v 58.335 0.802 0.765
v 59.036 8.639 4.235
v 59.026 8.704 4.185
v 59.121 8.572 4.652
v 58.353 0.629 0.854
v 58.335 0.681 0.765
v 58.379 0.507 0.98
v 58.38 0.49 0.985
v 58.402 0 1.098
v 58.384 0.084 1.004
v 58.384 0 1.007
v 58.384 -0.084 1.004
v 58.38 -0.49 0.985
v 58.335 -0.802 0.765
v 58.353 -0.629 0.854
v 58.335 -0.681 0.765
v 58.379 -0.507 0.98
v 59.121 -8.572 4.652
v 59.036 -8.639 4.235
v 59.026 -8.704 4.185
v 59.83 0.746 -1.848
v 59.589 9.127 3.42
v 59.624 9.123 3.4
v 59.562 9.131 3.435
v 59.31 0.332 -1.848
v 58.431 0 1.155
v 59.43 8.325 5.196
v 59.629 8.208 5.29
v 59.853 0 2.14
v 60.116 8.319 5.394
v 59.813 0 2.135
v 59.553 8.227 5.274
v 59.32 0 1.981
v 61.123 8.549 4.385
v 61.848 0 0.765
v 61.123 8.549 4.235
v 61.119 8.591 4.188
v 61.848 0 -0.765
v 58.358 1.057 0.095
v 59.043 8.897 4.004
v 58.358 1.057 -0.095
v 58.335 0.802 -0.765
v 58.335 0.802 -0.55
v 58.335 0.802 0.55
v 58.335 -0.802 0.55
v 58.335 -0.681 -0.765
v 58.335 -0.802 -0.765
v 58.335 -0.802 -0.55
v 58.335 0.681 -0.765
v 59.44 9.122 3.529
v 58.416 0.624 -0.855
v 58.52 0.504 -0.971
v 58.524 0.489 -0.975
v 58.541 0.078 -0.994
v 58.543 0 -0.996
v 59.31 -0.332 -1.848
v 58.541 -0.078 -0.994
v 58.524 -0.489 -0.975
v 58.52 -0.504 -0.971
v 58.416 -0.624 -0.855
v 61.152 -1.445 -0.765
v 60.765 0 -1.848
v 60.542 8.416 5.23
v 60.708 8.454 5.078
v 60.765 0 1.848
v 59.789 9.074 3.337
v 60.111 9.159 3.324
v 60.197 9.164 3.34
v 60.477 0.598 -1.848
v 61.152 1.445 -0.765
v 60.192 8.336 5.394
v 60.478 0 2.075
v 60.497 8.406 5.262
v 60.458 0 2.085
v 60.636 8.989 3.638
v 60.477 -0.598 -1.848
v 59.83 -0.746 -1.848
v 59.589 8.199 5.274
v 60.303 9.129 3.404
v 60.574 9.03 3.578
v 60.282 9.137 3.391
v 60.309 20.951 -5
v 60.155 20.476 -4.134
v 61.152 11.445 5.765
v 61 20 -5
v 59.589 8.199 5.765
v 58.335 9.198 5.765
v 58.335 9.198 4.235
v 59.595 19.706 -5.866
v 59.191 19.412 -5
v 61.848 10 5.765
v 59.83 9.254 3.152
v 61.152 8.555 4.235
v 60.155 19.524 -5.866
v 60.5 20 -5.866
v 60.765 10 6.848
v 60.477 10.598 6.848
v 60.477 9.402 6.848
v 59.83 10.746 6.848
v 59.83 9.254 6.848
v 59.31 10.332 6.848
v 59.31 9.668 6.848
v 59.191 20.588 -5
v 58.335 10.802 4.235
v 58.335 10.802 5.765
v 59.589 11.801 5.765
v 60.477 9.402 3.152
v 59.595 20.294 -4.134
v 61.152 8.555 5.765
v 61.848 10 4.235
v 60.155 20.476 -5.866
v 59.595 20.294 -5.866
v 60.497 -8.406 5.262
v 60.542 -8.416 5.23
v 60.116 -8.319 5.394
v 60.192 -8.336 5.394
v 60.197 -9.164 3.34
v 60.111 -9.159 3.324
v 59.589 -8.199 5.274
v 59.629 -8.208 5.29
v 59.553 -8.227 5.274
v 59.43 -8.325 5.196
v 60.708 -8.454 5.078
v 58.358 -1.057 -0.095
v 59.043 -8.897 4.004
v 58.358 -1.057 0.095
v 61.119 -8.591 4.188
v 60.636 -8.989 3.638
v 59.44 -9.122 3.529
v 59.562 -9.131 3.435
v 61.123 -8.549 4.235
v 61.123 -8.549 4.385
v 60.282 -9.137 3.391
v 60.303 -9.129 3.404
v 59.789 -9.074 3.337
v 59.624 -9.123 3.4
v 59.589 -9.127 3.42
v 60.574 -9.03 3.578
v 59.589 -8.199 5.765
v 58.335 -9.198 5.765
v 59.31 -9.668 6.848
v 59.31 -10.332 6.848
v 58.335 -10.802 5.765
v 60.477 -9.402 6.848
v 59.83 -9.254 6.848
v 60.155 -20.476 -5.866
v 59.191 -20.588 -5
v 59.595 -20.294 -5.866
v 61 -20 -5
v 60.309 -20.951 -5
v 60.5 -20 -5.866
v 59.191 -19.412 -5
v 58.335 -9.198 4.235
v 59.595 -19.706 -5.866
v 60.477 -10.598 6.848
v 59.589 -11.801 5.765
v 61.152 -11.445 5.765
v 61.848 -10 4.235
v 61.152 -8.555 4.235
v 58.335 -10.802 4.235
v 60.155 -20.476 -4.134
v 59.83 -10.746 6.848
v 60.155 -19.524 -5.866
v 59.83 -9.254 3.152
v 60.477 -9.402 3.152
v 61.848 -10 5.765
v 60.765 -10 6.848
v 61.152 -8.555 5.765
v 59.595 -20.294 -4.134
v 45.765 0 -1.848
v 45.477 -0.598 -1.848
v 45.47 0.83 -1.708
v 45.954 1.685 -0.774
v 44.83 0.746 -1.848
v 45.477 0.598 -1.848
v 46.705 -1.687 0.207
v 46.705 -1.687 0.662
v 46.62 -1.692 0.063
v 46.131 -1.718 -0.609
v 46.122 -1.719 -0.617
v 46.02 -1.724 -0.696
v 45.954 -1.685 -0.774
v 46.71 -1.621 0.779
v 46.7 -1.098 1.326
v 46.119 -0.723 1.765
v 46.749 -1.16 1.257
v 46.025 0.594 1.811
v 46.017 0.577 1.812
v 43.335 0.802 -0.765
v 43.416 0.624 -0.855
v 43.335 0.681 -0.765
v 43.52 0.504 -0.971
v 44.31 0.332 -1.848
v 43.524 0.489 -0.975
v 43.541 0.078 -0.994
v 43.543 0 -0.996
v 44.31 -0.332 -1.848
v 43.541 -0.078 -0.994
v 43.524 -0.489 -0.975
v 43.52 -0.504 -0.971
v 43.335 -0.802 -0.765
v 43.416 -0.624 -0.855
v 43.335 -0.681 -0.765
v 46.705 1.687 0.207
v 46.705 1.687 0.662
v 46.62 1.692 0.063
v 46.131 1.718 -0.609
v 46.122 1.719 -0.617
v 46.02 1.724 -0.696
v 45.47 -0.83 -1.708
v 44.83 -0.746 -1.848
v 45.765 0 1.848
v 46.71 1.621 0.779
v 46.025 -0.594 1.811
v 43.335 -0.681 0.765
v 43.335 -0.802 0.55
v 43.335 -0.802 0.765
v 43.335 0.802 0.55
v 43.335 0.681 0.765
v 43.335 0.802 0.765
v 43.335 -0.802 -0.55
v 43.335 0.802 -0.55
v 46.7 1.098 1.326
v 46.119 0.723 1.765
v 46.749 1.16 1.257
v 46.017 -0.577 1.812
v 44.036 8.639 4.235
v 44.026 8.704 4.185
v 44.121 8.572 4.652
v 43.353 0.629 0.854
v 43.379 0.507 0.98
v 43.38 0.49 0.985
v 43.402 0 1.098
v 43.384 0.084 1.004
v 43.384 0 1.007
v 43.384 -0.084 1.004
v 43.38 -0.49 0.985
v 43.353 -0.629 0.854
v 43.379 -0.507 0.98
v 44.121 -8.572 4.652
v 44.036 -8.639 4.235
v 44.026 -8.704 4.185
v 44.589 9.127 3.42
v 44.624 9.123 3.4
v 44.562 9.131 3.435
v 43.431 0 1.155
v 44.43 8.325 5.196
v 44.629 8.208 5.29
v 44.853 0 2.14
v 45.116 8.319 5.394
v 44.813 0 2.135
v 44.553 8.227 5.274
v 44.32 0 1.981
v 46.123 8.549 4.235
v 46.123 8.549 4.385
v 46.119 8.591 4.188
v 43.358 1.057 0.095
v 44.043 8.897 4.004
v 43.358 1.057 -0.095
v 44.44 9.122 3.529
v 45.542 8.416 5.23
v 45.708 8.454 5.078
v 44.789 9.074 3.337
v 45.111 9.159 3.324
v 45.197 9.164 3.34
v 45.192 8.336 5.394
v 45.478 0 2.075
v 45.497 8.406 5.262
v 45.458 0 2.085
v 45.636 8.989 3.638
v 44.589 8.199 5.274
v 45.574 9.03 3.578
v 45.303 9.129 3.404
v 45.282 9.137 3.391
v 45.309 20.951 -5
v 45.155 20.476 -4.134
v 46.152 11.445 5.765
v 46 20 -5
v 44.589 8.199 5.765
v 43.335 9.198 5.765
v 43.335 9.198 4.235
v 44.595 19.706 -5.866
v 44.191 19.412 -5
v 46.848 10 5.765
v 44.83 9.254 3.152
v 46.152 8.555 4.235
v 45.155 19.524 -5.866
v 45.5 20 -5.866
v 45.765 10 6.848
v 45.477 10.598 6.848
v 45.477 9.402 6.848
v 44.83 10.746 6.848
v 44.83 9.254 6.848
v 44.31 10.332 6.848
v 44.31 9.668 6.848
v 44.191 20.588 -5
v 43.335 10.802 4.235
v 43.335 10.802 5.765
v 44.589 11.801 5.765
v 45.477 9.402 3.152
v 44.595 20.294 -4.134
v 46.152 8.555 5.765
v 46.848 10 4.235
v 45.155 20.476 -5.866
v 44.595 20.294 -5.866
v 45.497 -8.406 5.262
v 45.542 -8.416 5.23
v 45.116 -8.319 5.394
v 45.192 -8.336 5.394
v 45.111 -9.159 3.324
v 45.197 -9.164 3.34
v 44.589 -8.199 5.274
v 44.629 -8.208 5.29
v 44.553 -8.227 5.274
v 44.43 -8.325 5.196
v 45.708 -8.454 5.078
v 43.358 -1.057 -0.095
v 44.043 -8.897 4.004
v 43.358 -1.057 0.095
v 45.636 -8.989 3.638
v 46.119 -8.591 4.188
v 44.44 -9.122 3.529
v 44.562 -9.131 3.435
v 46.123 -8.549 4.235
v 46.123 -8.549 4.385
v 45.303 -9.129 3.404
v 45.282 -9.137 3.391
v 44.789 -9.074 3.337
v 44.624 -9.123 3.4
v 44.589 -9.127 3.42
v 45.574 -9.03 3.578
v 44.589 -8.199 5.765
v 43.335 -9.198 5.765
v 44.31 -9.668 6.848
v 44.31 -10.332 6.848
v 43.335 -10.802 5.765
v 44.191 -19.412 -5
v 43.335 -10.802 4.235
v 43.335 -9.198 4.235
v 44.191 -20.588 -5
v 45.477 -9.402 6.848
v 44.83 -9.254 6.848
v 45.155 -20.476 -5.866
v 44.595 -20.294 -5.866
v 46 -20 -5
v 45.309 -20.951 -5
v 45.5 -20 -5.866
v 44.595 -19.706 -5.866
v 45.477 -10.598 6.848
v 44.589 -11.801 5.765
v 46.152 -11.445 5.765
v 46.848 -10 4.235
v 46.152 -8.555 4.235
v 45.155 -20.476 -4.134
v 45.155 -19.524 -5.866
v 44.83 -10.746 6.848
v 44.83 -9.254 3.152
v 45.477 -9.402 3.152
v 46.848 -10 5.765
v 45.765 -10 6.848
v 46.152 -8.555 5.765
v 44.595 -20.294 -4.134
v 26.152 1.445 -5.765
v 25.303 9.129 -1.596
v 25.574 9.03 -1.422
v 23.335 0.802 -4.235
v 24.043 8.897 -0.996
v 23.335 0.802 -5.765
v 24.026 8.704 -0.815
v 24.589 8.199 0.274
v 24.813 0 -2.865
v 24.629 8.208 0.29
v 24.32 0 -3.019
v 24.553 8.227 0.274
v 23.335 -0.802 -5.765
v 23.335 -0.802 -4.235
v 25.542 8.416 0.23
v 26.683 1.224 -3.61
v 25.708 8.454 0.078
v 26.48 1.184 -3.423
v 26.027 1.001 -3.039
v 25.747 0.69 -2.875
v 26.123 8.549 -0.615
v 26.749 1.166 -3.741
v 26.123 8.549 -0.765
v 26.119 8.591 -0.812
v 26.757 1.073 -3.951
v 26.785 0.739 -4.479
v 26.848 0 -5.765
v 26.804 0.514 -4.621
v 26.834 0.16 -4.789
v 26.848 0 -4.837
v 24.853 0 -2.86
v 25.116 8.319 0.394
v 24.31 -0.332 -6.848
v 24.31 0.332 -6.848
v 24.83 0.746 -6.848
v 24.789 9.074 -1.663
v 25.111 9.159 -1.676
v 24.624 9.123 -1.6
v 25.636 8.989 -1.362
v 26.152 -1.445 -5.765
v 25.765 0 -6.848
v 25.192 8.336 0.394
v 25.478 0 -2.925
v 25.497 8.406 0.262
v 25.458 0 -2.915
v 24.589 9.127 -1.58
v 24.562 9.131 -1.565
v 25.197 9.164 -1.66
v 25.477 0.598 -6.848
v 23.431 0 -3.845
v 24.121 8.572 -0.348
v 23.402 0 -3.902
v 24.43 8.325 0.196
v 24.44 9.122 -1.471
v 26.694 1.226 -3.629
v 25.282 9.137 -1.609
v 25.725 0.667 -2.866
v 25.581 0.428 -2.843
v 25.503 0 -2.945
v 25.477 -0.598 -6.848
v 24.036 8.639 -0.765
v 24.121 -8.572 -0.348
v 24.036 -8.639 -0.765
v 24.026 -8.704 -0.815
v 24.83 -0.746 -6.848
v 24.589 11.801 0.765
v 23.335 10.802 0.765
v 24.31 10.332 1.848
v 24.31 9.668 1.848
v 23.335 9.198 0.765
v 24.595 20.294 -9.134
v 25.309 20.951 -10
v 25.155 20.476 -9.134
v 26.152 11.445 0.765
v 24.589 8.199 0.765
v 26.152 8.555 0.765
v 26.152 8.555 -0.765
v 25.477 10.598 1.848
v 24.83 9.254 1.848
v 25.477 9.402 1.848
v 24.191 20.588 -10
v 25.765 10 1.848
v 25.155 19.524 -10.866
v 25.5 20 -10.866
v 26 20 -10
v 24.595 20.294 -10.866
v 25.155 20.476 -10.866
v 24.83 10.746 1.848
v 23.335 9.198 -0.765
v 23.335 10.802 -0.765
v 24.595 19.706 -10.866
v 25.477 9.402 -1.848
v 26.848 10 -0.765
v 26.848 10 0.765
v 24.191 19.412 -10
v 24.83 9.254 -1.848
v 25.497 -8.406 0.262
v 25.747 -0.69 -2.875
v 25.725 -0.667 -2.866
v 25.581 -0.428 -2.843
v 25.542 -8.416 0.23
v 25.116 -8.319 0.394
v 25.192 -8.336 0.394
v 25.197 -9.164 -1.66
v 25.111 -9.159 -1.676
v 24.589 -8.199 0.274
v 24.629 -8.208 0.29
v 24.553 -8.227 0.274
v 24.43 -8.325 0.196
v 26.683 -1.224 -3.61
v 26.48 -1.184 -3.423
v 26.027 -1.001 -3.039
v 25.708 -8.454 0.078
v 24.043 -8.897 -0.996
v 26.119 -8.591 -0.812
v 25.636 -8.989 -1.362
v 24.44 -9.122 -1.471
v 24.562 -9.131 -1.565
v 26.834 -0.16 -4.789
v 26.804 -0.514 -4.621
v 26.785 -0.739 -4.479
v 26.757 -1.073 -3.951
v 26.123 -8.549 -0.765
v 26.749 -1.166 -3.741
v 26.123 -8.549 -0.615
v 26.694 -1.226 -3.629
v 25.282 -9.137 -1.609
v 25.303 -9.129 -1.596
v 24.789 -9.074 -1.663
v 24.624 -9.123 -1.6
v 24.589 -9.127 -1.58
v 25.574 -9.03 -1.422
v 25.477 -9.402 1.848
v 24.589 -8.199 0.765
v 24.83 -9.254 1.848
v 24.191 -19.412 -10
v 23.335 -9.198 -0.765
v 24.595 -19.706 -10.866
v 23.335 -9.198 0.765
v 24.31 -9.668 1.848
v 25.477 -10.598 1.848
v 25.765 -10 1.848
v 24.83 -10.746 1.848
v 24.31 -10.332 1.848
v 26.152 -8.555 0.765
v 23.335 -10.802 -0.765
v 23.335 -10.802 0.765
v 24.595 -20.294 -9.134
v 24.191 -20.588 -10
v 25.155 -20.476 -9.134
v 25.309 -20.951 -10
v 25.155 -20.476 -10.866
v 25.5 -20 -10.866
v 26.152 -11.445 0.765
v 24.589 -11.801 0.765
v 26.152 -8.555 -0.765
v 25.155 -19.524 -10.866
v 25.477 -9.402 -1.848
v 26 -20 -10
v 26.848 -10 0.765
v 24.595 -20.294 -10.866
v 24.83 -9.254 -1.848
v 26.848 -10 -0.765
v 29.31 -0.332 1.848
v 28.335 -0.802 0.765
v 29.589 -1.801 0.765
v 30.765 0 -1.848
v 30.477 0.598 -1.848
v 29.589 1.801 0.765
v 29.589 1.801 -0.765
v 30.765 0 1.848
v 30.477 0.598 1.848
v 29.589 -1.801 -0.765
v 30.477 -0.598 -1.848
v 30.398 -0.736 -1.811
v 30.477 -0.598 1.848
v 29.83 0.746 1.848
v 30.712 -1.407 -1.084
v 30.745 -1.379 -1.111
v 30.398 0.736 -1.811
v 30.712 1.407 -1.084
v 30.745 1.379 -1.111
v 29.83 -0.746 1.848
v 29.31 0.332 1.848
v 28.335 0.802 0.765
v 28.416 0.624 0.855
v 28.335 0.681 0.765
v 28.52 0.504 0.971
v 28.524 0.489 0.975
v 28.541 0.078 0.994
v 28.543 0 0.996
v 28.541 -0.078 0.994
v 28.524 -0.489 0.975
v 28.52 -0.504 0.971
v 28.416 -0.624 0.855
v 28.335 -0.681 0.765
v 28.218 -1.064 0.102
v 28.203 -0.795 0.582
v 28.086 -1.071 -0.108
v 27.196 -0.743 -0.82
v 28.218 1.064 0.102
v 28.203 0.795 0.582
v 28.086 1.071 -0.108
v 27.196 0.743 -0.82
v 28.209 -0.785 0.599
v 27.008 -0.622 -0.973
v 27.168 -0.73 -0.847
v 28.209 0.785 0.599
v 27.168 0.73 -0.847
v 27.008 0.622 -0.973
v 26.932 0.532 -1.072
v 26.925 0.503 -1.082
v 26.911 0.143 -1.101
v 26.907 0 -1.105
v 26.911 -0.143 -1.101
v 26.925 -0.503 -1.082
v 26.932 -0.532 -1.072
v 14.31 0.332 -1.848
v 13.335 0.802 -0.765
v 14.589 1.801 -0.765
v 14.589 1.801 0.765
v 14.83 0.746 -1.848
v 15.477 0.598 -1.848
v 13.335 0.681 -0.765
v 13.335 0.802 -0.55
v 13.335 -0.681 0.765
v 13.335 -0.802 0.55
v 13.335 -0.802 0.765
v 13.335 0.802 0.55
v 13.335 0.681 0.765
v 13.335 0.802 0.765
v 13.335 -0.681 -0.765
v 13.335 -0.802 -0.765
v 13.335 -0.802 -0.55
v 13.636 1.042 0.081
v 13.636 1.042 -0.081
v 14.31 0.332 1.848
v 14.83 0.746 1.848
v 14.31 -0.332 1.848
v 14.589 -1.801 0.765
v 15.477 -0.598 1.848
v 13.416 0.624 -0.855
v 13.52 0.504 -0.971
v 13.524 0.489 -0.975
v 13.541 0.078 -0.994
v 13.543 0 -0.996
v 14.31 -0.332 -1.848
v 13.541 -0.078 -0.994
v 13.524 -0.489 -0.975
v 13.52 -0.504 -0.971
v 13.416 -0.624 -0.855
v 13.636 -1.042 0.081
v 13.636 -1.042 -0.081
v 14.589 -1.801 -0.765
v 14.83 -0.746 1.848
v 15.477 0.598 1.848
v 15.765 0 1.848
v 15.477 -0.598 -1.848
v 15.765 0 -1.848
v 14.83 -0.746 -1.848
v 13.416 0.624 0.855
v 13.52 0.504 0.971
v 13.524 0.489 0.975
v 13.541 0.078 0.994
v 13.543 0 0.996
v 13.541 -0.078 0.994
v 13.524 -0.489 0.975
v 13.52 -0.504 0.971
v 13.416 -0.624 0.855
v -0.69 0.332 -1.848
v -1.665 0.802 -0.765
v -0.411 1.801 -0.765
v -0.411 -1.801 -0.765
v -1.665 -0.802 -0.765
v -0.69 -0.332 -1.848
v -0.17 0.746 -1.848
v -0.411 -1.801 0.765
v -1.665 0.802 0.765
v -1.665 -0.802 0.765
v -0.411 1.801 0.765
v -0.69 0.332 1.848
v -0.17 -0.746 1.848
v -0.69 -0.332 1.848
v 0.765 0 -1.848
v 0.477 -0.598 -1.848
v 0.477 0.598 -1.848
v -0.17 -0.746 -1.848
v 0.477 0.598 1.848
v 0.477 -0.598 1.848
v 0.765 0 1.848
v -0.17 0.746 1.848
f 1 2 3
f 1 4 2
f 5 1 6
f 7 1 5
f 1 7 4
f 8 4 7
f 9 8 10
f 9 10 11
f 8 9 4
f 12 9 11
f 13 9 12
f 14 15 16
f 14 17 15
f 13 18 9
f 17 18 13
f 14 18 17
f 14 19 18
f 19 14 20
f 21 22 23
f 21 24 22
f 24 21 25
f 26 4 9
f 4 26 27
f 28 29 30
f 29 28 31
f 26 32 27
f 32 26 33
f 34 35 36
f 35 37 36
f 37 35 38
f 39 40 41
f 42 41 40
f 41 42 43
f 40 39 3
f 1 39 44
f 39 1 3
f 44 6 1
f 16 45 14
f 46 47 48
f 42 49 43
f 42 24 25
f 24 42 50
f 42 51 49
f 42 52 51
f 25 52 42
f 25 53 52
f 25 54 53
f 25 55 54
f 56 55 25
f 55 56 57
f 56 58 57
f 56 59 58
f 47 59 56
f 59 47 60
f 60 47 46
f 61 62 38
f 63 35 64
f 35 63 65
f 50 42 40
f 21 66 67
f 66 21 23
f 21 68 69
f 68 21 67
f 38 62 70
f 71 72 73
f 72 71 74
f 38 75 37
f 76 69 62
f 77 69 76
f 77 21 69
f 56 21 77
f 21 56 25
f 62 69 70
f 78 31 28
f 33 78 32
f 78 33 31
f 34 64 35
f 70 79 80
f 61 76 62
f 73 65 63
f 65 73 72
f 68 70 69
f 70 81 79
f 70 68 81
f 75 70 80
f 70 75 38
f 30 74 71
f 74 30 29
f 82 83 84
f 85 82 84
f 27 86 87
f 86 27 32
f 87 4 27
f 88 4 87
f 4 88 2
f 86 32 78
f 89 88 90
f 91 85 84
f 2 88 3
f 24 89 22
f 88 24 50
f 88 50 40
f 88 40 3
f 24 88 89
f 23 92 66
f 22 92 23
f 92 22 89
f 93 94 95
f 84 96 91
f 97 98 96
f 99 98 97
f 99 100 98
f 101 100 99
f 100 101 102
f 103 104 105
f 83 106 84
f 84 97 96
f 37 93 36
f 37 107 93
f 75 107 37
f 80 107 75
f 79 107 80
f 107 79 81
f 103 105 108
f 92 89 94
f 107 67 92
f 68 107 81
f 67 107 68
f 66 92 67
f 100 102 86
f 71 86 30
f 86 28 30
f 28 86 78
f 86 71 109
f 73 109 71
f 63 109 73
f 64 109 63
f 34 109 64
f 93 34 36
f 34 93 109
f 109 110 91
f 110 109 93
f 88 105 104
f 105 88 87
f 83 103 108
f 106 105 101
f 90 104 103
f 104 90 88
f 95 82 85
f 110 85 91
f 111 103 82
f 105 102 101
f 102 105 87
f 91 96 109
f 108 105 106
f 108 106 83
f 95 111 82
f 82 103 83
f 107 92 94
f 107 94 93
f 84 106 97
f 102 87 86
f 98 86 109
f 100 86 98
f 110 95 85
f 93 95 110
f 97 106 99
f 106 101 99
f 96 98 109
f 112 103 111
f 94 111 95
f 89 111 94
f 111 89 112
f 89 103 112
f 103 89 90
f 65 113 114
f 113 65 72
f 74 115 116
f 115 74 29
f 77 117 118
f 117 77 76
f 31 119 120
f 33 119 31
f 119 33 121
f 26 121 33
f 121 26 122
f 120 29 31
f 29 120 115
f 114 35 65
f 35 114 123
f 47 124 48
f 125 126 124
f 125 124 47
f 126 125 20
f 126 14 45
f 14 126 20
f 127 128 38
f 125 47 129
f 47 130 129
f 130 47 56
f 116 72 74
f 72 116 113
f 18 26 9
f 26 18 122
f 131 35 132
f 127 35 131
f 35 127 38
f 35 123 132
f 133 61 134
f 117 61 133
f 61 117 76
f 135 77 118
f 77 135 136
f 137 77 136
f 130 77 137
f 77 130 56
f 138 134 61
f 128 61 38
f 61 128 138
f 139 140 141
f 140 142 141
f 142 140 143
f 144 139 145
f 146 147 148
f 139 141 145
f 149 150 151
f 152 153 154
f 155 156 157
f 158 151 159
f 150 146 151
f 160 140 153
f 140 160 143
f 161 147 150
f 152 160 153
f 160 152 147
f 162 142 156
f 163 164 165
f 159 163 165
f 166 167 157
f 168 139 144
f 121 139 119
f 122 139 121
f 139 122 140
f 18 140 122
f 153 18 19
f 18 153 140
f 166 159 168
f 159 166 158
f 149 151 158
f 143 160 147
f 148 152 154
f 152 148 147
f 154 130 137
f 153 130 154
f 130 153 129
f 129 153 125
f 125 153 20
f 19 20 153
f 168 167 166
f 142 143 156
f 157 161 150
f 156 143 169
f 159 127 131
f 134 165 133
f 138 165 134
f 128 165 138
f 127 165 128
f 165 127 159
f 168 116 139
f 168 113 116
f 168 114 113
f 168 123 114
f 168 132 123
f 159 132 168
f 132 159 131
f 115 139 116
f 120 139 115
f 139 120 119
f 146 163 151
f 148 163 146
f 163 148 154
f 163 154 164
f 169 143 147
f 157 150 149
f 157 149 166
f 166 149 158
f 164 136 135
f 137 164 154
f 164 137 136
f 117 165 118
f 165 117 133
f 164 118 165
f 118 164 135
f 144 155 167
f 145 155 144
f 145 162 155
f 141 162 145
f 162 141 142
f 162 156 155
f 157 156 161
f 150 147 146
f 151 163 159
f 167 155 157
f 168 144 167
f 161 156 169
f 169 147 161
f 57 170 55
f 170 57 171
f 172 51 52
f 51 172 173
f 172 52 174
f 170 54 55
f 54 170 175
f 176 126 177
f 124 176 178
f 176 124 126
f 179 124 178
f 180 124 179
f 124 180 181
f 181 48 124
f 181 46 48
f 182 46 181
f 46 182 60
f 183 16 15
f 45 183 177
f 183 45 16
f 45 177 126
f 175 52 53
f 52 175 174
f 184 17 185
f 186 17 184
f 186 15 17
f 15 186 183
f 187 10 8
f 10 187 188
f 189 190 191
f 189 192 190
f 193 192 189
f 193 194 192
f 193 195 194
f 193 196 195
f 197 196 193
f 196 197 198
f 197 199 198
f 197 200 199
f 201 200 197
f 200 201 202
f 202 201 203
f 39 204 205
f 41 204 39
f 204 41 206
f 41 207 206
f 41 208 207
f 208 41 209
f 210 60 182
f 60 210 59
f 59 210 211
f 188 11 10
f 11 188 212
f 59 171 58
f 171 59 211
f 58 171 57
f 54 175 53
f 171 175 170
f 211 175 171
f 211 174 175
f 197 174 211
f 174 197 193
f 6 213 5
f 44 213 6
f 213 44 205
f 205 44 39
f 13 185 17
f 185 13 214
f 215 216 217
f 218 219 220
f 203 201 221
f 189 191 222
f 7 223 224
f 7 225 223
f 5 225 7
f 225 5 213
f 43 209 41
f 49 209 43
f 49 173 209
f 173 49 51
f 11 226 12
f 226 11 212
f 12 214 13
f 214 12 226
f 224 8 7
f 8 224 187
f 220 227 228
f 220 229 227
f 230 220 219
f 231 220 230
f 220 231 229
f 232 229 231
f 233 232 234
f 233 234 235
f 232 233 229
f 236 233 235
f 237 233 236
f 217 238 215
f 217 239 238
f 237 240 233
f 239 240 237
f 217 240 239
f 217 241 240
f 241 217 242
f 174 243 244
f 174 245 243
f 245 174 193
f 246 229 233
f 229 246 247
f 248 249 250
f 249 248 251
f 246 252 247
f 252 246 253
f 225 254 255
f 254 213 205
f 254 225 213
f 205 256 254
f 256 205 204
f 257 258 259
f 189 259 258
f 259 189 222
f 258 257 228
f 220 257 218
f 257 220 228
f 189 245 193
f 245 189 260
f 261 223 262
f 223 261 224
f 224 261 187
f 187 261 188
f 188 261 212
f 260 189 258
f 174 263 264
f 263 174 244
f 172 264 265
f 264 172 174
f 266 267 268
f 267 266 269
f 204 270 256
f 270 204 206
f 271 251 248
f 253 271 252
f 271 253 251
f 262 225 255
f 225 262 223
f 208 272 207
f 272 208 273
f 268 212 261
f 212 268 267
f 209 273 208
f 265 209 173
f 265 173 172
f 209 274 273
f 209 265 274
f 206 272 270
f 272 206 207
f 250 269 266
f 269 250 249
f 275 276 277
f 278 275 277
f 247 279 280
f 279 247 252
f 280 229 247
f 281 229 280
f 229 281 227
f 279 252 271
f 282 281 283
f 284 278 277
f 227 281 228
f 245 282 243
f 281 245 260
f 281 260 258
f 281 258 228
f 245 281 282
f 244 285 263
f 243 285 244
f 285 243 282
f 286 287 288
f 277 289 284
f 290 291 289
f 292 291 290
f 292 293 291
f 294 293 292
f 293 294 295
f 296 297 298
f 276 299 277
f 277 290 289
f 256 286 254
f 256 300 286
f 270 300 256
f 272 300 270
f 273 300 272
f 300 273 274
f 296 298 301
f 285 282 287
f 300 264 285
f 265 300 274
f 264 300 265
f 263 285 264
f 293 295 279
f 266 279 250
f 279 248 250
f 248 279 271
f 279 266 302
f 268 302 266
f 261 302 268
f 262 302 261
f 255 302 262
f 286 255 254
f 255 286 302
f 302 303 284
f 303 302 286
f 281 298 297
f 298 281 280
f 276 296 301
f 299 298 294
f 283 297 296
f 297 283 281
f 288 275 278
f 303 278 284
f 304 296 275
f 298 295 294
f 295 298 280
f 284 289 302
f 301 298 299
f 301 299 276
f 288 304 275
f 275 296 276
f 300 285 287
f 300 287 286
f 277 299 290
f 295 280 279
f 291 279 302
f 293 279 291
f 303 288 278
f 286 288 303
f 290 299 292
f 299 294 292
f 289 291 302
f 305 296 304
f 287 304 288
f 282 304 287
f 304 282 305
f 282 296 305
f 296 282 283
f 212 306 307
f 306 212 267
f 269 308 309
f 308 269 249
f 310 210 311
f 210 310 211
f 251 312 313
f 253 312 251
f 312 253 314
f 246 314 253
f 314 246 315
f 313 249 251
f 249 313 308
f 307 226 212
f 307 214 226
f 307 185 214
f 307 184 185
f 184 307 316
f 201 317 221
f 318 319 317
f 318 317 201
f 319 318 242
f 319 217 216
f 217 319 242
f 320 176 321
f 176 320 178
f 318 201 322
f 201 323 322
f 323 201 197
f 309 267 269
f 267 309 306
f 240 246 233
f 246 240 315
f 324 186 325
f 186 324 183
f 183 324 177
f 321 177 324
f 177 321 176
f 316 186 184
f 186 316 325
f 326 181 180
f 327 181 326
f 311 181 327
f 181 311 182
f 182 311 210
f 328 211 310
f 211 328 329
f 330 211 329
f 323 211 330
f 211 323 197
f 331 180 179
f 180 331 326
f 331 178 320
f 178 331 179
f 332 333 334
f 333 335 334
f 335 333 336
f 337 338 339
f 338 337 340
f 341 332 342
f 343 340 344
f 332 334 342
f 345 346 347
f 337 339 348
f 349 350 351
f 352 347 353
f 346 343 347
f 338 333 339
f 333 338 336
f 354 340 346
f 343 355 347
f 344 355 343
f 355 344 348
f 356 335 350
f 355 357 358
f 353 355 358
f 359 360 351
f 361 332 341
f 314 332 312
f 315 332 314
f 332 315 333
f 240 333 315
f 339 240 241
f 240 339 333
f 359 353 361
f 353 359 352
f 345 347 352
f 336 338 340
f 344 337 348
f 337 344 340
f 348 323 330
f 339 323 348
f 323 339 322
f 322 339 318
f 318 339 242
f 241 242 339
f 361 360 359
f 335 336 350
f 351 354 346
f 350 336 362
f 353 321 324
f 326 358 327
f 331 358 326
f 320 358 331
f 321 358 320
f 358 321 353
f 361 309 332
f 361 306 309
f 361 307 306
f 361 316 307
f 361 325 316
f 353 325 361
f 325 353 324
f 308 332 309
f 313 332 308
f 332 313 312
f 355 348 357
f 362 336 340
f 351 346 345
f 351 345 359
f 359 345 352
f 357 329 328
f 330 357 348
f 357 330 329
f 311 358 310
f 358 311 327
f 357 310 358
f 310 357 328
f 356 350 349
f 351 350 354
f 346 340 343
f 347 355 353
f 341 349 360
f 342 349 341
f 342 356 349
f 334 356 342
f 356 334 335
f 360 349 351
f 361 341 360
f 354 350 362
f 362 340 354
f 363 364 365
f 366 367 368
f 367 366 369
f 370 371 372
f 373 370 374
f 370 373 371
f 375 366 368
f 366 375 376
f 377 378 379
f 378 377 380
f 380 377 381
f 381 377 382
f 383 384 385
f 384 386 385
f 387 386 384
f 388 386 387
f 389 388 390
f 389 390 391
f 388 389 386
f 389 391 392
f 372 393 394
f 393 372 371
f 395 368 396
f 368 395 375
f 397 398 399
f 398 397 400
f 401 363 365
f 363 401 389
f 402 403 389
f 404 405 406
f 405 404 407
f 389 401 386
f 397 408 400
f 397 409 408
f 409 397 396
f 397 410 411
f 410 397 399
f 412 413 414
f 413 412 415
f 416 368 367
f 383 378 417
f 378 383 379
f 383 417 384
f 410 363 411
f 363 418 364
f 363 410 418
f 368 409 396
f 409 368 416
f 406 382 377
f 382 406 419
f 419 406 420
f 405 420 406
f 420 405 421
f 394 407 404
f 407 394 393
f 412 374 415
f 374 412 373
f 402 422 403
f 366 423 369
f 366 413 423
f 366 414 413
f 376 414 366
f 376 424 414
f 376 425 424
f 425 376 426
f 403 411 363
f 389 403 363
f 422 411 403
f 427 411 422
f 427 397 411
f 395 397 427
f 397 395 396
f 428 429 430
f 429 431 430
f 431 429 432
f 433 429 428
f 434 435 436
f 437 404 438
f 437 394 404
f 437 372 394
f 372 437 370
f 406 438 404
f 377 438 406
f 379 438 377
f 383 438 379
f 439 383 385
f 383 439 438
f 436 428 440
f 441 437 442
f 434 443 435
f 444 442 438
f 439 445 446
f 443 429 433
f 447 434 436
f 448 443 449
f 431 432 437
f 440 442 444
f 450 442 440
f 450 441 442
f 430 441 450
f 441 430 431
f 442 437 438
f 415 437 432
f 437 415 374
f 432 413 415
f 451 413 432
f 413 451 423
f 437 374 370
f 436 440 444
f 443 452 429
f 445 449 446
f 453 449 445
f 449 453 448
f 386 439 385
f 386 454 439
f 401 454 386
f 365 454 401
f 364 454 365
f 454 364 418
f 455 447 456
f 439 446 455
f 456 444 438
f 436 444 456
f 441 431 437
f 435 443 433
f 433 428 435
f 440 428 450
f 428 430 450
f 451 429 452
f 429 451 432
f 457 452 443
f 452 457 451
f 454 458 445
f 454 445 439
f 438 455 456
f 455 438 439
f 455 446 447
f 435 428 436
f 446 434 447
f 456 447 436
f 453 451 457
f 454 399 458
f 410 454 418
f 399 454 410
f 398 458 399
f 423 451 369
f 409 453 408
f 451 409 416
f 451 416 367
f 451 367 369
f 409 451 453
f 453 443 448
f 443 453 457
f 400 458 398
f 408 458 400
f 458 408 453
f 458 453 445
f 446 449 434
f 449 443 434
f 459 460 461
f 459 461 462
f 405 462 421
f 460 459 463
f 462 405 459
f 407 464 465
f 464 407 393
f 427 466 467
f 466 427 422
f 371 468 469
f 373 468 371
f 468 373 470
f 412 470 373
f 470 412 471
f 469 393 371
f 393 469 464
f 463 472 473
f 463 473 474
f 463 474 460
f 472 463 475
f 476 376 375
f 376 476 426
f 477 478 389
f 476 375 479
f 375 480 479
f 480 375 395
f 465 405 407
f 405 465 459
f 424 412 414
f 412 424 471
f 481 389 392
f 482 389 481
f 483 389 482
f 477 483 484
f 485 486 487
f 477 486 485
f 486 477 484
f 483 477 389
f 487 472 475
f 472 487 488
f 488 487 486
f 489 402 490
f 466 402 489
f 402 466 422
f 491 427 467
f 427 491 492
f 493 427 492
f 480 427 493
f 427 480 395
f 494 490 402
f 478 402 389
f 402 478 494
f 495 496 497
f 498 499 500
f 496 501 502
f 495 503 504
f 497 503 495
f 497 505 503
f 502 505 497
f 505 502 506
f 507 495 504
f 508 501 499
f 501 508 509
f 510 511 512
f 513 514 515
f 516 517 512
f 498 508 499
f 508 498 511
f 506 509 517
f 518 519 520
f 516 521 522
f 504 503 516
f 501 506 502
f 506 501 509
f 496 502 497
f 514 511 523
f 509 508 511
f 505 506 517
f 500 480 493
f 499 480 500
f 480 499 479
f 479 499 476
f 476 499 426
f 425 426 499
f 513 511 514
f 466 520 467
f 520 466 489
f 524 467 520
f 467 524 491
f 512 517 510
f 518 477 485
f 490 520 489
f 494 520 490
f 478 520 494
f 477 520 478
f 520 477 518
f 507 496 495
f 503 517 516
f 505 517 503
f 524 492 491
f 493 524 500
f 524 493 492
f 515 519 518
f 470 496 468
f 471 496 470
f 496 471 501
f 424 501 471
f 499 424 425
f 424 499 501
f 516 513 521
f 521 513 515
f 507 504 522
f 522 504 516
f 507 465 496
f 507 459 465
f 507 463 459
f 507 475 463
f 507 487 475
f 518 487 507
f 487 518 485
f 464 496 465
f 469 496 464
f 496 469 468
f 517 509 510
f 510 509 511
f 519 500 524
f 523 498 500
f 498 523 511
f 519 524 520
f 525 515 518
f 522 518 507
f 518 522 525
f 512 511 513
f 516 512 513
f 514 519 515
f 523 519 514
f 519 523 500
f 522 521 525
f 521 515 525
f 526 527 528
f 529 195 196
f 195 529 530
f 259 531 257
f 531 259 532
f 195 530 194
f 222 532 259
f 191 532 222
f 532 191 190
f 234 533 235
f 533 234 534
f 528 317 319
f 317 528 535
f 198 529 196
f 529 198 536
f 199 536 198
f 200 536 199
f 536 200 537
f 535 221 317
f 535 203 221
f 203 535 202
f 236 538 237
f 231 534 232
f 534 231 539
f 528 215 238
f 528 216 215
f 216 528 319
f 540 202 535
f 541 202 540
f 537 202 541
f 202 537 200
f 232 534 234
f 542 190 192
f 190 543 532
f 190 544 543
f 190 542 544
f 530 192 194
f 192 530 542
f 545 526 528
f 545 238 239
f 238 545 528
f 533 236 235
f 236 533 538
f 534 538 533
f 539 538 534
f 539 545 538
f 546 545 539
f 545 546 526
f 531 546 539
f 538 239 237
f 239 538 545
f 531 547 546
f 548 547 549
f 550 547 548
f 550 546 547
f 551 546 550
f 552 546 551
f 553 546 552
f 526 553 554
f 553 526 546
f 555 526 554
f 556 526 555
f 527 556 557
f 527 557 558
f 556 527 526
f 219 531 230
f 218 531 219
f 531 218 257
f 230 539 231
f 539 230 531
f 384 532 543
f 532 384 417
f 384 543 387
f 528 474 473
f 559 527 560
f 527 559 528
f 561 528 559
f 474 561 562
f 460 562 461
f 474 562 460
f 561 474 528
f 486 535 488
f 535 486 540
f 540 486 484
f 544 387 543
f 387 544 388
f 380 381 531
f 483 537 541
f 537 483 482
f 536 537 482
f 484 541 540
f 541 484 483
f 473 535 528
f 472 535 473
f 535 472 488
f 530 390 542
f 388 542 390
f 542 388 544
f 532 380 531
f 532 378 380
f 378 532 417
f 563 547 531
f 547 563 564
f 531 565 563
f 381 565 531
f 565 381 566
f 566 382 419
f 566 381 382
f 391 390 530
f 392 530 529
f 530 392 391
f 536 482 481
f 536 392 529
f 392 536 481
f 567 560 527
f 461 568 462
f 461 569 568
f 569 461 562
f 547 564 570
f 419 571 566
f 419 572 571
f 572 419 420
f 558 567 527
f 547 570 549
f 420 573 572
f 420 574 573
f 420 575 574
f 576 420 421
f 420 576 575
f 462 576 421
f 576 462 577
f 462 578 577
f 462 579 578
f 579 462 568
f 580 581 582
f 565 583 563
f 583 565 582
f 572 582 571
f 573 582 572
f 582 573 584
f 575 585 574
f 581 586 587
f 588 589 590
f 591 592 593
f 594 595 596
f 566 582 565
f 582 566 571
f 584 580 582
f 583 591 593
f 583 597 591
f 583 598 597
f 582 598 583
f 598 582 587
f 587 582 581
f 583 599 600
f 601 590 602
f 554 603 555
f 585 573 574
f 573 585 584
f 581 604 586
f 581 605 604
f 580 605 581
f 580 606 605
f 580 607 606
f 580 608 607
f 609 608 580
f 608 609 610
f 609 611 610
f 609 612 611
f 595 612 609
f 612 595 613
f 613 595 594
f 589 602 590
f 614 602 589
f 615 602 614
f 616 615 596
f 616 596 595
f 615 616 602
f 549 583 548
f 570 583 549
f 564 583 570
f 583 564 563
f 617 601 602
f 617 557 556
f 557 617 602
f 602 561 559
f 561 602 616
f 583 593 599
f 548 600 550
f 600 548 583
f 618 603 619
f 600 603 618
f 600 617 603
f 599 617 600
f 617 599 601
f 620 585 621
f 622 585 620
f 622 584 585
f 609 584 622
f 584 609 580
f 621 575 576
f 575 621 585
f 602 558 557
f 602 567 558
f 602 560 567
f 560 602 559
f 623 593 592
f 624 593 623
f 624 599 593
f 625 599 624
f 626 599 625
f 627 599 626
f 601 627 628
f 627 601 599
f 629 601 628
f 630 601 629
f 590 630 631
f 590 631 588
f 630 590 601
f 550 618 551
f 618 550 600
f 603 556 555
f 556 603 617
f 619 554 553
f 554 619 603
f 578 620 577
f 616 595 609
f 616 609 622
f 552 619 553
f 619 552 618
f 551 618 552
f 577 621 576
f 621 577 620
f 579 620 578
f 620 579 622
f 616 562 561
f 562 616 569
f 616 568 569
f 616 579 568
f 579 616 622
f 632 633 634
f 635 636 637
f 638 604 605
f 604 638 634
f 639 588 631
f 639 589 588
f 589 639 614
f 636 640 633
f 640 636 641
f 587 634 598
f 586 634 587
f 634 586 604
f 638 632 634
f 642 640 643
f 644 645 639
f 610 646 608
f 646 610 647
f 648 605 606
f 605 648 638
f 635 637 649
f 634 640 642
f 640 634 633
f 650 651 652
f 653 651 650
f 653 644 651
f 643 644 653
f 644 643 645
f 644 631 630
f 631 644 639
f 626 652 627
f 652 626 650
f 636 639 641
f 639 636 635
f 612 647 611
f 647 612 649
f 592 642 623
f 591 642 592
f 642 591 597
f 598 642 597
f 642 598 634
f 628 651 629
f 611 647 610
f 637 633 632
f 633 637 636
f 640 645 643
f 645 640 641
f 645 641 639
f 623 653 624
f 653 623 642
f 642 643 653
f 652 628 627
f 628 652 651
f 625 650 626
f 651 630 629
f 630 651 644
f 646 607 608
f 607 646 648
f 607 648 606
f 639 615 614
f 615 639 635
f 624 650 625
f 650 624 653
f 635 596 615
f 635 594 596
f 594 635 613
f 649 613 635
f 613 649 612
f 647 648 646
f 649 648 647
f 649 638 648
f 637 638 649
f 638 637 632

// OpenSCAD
segment=[15,0,0,[1,1,1]];
downsegment=[-5,0,-5,[1,1,1]];
body = [
	[segment, [
		[segment, [lleg(), rleg()]], lleg(),
		rleg()
	]],
	[downsegment, [lleg(), rleg()]]
];
V3d =[[segment, [[segment,body]]]];
function lleg()=[[0,10,5,[1,1,1]],[[[0,10,-10,[1,1,1]]]]];
function rleg()=[[0,-10,5,[1,1,1]],[[[0,-10,-10,[1,1,1]]]]];

profile = [
 [5, 5],
 [0,6],
[-5, 5],
[-7,0],
[-5, -5],
[0,-6],
[5, -5],
[7,0]

];

bodypart(profile, V3d );
module bodypart(profile, List, root=[0,0,0]) {
for(i = [0: len(List) - 1]) {

line(t(root),t(root+List[i][0] )) ;
 echo(i,root,List[i][0]);
bodypart(profile,List[i][1] ,root+List[i][0]);

 }
}
module line(s,f,h=2){
  hull() {
    translate(t(s)) sphere(h);
    translate(t(f)) sphere(h / 2);
  }
}
function getanglexz(v) = (len(v) == 3||len(v) == 4) ? [0, 0, 0] + geteulerxz(lim3(1, v)): [90, 0, 0] + [0, 0, -atan2(v[0], v[1])]; 
function getangle(v) = (len(v) == 3||len(v) == 4) ? [0, 90, 0] + geteuler(lim3(1, v)): [90, 0, 0] + [0, 0, -atan2(v[0], v[1])];
function lerp(start,end,bias ) = (end * bias + start * (1 - bias));
function geteuler(v) = [0, -asin(v[2]), atan2(v2xy(v)[1], v2xy(v)[0])]; //Euler angles from Vec3
function geteulerxz(v) = [0, atan2(v[0], v[2]), 0]; //Euler angles from Vec3
function v2xy(v) = lim3(1, [v[0], v[1], 0]); // down projection xyz2xy
function lim3(l, v) = v / len3(v) * l; // normalize Vec37Vec4 to magnitude l
function len3(v) = sqrt(pow(v[0], 2) + pow(v[1], 2) + pow(v[2], 2)); // find magnitude of Vec3
function v(i,v)=v[i+1]-v[i]; // vec3 from polyline segment
function t(v) = [v[0], v[1], v[2]];// purge vec4... down to vec3 (for translate to play nice)
